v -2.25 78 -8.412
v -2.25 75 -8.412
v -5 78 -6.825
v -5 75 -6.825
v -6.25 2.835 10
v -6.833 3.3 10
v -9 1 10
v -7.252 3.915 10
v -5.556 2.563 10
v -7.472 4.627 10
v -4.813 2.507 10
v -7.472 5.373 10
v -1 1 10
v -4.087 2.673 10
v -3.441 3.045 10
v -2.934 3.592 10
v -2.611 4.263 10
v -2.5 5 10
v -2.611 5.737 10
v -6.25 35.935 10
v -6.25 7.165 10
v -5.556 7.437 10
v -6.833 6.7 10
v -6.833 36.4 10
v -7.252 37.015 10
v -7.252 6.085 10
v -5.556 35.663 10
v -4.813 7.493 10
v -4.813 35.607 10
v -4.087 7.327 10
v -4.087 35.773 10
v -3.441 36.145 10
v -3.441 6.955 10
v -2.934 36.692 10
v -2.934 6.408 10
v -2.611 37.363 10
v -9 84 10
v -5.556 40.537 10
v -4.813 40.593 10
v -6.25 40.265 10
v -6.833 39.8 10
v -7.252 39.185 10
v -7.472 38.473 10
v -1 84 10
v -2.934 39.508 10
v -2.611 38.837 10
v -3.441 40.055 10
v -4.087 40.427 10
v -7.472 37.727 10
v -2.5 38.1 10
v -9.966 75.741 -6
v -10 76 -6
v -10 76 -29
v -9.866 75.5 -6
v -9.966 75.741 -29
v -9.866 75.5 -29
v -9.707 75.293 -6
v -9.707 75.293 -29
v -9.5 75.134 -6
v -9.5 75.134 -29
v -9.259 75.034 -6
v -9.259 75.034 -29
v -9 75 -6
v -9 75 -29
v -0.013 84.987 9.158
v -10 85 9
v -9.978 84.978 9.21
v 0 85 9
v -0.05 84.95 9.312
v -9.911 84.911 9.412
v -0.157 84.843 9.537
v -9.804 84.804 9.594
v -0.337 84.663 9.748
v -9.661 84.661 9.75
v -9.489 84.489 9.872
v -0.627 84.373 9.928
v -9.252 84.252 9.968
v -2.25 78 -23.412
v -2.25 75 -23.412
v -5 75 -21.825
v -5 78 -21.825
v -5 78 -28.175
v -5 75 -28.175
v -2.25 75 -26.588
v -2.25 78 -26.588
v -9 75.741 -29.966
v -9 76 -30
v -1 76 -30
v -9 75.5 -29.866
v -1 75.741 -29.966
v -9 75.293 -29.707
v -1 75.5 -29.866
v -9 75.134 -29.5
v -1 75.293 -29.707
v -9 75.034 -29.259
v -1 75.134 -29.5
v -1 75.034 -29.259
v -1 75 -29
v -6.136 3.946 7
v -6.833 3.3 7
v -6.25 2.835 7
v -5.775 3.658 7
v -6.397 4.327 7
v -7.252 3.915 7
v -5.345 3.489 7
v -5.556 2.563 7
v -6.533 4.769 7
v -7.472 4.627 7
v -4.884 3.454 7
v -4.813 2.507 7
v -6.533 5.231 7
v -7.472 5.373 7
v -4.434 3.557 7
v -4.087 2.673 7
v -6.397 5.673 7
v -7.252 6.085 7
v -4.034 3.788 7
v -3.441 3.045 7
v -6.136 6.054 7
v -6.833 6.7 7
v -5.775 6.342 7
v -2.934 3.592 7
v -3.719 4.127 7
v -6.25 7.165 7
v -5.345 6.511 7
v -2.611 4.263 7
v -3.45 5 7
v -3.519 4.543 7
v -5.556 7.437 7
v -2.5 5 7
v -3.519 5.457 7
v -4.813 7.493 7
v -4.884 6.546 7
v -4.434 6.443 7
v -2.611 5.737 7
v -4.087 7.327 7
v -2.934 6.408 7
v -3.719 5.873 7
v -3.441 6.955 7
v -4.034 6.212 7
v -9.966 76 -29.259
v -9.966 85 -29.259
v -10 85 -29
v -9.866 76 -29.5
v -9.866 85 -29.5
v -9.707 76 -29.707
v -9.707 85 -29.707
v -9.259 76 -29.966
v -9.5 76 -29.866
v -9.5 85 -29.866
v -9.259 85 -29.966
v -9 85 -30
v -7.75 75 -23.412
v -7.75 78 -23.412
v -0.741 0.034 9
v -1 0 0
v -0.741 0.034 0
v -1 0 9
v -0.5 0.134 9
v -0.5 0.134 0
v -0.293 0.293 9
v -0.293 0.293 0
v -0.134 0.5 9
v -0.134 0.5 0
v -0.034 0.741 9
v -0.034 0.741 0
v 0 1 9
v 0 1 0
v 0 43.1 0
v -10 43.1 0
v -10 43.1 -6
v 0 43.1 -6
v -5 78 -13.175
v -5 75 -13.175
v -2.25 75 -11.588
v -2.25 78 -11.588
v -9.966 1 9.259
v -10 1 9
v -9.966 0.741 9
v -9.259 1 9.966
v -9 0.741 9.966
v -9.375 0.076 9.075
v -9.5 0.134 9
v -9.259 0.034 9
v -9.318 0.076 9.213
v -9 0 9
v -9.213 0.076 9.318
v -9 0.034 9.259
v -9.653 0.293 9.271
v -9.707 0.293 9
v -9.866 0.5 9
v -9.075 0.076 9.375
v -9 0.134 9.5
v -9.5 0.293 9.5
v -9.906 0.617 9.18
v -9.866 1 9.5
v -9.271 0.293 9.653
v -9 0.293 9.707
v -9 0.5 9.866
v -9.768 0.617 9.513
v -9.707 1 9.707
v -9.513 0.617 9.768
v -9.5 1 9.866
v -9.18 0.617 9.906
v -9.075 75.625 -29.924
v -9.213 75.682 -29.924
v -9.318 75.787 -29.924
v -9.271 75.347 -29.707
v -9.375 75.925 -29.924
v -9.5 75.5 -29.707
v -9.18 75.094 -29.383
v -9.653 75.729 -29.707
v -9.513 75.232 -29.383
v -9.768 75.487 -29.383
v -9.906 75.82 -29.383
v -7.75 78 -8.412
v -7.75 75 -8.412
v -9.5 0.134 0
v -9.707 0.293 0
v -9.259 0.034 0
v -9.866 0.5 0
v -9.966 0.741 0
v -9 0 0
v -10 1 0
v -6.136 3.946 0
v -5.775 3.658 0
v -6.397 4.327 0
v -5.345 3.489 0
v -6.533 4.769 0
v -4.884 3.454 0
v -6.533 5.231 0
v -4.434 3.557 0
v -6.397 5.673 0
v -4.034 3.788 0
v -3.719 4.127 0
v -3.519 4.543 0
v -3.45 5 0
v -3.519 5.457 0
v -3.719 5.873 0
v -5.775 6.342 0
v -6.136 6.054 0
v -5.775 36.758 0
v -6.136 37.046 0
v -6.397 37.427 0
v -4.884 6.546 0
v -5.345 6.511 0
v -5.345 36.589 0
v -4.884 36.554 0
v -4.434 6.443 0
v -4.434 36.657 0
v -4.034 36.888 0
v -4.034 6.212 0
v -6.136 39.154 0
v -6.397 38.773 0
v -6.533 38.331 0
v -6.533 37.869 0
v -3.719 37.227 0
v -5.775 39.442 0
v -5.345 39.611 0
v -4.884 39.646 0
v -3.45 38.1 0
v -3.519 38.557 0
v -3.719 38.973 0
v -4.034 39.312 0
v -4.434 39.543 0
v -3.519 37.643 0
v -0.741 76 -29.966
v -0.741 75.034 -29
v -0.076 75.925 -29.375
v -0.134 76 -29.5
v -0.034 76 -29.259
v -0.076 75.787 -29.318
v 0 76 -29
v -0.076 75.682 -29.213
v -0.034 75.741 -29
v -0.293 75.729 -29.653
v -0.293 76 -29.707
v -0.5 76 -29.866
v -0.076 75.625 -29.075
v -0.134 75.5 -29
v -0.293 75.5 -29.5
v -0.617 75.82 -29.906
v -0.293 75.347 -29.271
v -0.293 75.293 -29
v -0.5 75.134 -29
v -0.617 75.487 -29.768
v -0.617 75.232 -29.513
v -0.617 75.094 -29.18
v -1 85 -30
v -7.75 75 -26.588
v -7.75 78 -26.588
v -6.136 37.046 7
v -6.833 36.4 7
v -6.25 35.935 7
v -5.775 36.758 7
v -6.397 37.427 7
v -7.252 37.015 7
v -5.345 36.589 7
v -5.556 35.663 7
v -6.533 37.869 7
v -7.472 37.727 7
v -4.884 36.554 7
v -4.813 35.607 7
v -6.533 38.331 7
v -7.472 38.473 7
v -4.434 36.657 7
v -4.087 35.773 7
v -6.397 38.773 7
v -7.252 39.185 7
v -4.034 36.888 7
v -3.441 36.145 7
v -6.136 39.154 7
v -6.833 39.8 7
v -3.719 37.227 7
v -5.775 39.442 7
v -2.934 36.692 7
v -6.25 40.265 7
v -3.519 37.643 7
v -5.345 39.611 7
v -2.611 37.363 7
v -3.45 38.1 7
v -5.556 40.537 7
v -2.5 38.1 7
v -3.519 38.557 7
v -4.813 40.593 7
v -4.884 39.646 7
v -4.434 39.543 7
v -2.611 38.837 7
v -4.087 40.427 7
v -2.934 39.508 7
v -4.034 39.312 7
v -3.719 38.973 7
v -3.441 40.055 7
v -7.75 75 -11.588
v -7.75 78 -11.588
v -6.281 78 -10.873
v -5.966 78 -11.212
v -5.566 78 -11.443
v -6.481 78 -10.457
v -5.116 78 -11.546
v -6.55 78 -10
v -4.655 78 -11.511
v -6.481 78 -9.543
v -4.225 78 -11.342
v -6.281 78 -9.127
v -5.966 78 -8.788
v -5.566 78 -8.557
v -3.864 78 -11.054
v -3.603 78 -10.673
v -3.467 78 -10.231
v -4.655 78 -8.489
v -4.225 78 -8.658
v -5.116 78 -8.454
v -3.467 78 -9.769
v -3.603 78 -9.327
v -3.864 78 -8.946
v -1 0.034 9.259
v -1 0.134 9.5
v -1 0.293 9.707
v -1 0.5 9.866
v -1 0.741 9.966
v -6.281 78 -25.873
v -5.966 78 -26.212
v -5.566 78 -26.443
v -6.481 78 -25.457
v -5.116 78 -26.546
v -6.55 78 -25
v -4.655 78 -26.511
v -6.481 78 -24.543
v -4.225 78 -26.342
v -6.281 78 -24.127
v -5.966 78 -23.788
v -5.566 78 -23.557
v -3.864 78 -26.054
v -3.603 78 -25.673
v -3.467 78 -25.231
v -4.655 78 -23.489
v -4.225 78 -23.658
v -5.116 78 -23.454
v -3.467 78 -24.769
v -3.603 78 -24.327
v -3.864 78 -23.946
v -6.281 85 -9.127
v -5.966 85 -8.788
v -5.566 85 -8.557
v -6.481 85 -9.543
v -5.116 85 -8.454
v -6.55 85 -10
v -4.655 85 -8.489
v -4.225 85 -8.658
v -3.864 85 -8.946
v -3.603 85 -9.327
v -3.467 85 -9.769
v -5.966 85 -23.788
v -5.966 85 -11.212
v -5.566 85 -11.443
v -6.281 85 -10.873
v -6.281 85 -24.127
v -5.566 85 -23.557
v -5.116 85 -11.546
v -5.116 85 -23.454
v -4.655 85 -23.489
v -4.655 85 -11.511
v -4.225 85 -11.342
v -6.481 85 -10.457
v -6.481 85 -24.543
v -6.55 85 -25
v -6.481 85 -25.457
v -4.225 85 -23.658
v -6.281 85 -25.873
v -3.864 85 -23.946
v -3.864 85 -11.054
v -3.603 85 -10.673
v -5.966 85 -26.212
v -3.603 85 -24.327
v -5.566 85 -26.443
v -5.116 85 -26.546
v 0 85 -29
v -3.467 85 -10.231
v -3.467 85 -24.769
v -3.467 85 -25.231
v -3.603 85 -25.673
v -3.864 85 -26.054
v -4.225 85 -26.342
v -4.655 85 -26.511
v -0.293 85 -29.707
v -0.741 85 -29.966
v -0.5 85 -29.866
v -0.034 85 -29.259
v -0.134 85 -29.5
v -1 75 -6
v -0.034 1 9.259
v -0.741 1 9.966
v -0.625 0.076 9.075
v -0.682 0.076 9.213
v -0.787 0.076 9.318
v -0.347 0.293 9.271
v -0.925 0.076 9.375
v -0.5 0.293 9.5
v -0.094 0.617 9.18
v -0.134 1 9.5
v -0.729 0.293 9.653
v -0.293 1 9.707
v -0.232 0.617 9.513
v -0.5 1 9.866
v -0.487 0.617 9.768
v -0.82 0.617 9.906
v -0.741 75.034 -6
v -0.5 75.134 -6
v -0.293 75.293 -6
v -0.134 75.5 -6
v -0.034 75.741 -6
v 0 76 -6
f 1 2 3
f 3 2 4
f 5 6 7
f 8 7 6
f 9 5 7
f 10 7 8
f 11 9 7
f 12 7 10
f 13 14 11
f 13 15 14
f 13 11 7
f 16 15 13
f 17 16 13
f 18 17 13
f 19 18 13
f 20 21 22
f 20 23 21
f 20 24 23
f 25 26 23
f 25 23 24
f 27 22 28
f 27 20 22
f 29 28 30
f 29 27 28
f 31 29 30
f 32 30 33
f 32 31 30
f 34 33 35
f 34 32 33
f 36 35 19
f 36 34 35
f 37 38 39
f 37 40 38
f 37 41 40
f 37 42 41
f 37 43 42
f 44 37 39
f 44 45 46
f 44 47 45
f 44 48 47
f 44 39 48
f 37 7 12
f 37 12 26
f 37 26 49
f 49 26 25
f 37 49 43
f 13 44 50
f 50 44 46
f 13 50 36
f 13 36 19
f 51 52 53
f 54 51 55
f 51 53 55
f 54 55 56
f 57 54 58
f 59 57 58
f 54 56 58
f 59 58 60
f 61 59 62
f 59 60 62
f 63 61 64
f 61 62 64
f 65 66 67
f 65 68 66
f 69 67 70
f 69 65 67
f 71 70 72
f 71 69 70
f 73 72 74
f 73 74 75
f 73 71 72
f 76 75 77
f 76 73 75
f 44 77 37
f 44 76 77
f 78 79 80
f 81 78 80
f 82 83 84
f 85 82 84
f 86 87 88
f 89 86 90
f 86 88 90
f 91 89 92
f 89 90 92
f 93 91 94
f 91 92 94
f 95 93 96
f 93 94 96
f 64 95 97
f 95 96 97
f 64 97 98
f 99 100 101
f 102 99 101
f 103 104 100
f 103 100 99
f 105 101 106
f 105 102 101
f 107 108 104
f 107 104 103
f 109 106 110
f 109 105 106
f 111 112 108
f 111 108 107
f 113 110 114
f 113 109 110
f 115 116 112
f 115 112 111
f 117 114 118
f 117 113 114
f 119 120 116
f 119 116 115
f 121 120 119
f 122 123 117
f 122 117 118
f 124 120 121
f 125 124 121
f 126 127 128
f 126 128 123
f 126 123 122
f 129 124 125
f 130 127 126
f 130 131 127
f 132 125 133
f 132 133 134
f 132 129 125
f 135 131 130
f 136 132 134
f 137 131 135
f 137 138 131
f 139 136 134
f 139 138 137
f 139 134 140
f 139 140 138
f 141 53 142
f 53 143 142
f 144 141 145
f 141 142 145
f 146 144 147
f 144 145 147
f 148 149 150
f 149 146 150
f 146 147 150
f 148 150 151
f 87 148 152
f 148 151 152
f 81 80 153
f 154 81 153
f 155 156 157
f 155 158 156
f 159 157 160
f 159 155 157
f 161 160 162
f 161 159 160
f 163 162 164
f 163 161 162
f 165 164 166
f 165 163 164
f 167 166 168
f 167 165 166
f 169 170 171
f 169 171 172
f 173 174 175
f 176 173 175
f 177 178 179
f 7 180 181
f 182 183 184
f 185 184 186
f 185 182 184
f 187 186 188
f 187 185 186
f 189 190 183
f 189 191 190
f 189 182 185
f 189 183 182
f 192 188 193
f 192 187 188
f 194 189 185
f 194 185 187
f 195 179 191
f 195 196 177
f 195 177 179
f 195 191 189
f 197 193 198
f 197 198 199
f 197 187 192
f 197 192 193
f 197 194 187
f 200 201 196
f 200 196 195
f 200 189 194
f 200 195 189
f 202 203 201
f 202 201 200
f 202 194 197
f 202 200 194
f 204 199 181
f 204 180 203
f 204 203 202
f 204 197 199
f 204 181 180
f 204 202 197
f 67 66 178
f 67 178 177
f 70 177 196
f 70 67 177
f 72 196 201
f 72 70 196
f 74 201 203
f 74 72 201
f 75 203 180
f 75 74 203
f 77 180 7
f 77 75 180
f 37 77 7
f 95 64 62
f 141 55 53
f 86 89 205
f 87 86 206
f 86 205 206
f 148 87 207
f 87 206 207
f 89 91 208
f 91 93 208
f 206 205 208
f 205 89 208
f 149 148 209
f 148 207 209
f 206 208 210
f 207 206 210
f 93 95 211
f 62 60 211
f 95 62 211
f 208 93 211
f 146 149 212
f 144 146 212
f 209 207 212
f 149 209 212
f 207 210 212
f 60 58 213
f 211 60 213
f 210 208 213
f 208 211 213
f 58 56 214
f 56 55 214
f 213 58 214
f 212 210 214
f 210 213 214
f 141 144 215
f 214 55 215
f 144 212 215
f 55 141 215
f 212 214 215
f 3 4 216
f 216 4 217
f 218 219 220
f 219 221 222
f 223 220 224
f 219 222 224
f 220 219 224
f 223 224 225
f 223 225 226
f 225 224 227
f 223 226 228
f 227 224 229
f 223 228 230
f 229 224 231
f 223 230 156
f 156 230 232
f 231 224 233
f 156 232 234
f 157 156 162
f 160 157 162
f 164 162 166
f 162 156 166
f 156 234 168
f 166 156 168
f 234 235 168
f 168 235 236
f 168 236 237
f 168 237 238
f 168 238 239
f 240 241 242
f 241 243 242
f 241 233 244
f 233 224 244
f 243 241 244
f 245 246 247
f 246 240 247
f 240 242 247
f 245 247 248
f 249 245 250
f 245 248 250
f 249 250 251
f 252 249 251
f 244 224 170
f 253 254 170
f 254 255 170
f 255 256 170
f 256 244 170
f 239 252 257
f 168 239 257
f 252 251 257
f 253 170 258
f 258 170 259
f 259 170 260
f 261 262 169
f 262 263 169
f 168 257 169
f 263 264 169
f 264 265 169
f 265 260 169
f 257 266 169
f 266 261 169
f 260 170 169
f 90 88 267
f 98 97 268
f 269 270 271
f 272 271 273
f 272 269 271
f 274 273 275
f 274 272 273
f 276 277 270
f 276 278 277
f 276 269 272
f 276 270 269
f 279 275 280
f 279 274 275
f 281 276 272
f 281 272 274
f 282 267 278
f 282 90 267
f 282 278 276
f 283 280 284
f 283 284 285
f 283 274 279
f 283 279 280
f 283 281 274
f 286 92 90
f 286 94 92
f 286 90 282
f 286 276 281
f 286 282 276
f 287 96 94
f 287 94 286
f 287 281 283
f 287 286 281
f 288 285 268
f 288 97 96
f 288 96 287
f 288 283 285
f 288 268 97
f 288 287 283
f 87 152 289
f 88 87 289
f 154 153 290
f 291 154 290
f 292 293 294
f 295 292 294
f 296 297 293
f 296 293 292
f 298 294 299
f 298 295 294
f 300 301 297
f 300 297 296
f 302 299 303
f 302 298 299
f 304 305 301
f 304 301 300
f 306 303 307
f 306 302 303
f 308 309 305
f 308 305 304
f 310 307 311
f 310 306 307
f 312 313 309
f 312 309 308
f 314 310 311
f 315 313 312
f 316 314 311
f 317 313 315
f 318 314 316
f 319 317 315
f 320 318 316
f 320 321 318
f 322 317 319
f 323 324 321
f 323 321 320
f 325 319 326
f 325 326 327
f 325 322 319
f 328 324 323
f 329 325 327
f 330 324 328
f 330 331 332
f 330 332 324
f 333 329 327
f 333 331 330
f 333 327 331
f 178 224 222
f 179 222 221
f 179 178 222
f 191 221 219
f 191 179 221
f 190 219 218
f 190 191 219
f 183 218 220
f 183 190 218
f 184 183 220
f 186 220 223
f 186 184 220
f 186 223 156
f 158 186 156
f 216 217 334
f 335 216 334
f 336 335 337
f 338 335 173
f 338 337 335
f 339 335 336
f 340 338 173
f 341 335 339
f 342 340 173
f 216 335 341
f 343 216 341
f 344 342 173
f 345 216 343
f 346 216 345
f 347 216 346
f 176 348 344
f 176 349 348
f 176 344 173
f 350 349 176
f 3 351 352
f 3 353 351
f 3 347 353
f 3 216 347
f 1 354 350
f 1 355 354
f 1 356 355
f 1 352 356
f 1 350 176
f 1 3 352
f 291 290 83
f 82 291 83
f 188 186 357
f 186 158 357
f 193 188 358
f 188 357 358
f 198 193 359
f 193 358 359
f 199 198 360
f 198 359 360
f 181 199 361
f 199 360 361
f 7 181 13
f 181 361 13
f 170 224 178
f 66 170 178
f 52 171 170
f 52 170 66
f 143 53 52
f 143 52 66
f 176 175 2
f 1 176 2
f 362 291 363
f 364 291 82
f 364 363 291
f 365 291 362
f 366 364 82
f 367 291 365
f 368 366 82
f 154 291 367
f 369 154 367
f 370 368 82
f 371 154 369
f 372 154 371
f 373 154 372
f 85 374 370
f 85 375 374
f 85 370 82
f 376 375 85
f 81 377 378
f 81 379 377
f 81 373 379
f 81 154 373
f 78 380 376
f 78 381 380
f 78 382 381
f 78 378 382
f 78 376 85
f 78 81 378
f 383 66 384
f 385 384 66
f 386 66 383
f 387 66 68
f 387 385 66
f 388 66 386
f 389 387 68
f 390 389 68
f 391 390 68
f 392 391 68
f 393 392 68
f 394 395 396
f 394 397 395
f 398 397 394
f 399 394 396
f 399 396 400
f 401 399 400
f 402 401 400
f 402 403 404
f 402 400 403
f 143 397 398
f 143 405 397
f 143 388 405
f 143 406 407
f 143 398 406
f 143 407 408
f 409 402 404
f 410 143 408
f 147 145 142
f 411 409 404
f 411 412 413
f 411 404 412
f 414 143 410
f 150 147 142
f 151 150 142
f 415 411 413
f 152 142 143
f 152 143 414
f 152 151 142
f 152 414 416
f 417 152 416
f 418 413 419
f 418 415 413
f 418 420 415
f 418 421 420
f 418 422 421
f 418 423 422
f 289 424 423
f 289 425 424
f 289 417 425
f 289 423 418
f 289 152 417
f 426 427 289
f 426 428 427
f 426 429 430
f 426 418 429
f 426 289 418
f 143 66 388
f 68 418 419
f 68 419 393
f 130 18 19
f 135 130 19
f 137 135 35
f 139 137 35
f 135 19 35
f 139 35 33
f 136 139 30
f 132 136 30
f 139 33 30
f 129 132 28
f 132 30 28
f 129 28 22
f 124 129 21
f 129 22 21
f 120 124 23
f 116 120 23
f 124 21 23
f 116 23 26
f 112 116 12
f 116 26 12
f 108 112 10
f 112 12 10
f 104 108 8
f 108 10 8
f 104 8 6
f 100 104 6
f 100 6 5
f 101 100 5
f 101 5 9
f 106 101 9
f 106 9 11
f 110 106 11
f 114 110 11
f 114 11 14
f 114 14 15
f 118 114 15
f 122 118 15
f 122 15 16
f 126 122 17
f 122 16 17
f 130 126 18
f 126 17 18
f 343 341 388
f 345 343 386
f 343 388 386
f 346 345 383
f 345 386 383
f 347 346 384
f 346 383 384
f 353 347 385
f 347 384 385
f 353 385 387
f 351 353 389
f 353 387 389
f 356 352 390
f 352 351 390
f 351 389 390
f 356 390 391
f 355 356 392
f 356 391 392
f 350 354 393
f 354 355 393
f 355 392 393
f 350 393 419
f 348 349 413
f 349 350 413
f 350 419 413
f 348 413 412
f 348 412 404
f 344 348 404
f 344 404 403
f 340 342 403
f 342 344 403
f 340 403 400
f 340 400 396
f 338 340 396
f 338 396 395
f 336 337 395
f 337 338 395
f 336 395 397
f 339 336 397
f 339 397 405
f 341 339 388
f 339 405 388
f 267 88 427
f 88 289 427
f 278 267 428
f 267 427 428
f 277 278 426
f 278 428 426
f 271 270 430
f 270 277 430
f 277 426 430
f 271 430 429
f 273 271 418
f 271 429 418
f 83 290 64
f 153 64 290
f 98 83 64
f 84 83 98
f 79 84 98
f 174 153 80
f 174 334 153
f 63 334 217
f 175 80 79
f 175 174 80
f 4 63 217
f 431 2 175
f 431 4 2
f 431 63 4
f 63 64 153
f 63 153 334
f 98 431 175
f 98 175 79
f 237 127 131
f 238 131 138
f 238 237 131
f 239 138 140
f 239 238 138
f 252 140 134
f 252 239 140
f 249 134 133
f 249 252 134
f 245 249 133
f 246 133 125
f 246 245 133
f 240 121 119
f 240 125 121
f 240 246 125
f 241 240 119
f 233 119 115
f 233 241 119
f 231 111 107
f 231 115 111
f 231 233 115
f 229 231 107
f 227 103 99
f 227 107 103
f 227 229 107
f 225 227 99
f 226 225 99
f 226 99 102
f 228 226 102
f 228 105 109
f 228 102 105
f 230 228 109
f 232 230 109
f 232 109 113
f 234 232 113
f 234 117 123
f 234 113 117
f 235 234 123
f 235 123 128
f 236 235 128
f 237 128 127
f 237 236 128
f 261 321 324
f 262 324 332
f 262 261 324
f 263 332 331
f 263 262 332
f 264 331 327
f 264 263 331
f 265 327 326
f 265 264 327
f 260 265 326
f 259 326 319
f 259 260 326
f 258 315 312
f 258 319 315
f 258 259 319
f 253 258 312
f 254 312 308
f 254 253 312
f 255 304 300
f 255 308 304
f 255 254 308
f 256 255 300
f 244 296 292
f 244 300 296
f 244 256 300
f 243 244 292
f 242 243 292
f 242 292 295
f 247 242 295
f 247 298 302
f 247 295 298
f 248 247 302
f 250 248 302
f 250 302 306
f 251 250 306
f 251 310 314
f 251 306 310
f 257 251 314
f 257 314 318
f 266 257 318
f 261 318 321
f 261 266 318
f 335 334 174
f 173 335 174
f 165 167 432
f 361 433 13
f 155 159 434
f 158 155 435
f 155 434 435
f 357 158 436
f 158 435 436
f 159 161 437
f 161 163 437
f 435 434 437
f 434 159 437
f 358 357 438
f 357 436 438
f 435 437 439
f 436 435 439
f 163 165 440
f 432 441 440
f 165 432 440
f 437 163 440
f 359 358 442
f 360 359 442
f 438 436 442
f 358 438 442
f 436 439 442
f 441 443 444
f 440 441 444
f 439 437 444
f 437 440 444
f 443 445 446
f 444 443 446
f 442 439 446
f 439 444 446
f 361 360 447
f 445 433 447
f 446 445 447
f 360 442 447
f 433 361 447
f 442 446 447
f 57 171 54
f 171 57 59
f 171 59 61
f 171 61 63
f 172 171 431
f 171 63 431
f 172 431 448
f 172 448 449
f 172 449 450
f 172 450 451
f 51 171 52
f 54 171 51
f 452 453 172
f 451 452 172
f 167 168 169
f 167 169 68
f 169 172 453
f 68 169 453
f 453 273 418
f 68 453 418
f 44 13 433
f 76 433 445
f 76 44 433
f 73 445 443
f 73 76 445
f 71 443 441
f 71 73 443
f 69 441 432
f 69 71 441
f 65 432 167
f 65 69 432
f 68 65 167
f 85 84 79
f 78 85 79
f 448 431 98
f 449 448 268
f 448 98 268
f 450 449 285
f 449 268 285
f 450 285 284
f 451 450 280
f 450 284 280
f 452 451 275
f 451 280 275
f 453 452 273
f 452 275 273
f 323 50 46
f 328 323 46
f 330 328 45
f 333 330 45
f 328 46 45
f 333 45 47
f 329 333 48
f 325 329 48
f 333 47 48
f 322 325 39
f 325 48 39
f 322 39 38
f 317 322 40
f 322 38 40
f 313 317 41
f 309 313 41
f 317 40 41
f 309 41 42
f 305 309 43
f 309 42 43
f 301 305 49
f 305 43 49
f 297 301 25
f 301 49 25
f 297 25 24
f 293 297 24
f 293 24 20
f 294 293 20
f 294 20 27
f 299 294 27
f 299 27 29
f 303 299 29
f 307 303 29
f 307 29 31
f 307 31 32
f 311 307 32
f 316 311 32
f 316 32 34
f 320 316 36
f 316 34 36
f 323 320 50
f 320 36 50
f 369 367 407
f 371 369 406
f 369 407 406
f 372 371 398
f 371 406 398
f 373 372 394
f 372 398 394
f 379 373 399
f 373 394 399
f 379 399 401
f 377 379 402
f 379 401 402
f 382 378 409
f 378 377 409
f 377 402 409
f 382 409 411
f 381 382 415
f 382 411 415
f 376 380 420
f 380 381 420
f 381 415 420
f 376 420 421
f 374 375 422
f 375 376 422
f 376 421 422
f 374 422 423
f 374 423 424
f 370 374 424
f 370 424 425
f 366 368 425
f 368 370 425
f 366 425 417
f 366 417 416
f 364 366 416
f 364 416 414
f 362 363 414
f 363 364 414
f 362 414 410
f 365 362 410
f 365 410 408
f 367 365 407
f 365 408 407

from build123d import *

# Parameters (mm, degrees)
F0_W          = 10
F0_H          = 43.1
F0_R          = 1.55
F1_DEPTH      = 10
F0_H_2        = 31.9
F2_DEPTH      = 10
F2_DEPTH_BACK = 6
F0_H_3        = 10
F3_DEPTH      = 30
F3_DEPTH_BACK = 10
F4_R          = 1.55
F5_DEPTH      = 15
F6_R          = 1
F7_R          = 1.55
F8_DEPTH      = 3
F9_R          = 2.5
F10_DEPTH     = 3


with BuildPart() as f1:
    # F0 (on Top) → F1 (new body)
    with BuildSketch(Plane.XY):
        with Locations((-5, 21.55)):
            Rectangle(F0_W, F0_H)
        with Locations((-5, 5)):
            Circle(F0_R, mode=Mode.SUBTRACT)
        with Locations((-5, 38.1)):
            Circle(F0_R, mode=Mode.SUBTRACT)
    extrude(amount=F1_DEPTH)

    # F0 (on Top) → F2 (join, two sides)
    with BuildSketch(Plane.XY) as f2_sk:
        with Locations((-5, 59.05)):
            Rectangle(F0_W, F0_H_2)
    extrude(amount=F2_DEPTH)
    extrude(f2_sk.sketch, amount=-F2_DEPTH_BACK)

    # F0 (on Top) → F3 (join, two sides)
    with BuildSketch(Plane.XY) as f3_sk:
        with Locations((-5, 80)):
            Rectangle(F0_W, F0_H_3)
    extrude(amount=-F3_DEPTH)
    extrude(f3_sk.sketch, amount=F3_DEPTH_BACK)

    # F4 (on face) → F5 (cut)
    with BuildSketch(Plane(origin=(0, 85, 0), x_dir=(-1, 0, 0), z_dir=(0, 1, 0))):
        with Locations((5, -25)):
            Circle(F4_R)
        with Locations((5, -10)):
            Circle(F4_R)
    extrude(amount=-F5_DEPTH, mode=Mode.SUBTRACT)

    # F6
    f6_edges = [f1.edges().sort_by_distance(p)[0] for p in [
        (-10, 42.5, 10),
        (0, 42.5, 10),
        (-5, 85, 10),
        (-10, 75, -18),
        (-5, 75, -30),
        (0, 80, -30),
        (-10, 80, -30),
        (-10, 0, 5),
        (0, 0, 5),
        (-5, 0, 10),
        (0, 75, -18),
    ]]
    fillet(f6_edges, radius=F6_R)

    # F7 (on face) → F8 (cut)
    with BuildSketch(Plane.XZ.offset(-75)):
        Polygon((-2.25, -11.5877132403), (-2.25, -8.4122867597), (-5, -6.8245735195), (-7.75, -8.4122867597), (-7.75, -11.5877132403), (-5, -13.1754264805), align=None)
        with Locations((-5, -10)):
            Circle(F7_R, mode=Mode.SUBTRACT)
        Polygon((-2.25, -26.5877132403), (-2.25, -23.4122867597), (-5, -21.8245735195), (-7.75, -23.4122867597), (-7.75, -26.5877132403), (-5, -28.1754264805), align=None)
        with Locations((-5, -25)):
            Circle(F7_R, mode=Mode.SUBTRACT)
    extrude(amount=-F8_DEPTH, mode=Mode.SUBTRACT)

    # F9 (on face) → F10 (cut)
    with BuildSketch(Plane.XY.offset(10)):
        with Locations((-5, 38.1)):
            Circle(F9_R)
        with Locations((-5, 5)):
            Circle(F9_R)
    extrude(amount=-F10_DEPTH, mode=Mode.SUBTRACT)


solid = f1.part
